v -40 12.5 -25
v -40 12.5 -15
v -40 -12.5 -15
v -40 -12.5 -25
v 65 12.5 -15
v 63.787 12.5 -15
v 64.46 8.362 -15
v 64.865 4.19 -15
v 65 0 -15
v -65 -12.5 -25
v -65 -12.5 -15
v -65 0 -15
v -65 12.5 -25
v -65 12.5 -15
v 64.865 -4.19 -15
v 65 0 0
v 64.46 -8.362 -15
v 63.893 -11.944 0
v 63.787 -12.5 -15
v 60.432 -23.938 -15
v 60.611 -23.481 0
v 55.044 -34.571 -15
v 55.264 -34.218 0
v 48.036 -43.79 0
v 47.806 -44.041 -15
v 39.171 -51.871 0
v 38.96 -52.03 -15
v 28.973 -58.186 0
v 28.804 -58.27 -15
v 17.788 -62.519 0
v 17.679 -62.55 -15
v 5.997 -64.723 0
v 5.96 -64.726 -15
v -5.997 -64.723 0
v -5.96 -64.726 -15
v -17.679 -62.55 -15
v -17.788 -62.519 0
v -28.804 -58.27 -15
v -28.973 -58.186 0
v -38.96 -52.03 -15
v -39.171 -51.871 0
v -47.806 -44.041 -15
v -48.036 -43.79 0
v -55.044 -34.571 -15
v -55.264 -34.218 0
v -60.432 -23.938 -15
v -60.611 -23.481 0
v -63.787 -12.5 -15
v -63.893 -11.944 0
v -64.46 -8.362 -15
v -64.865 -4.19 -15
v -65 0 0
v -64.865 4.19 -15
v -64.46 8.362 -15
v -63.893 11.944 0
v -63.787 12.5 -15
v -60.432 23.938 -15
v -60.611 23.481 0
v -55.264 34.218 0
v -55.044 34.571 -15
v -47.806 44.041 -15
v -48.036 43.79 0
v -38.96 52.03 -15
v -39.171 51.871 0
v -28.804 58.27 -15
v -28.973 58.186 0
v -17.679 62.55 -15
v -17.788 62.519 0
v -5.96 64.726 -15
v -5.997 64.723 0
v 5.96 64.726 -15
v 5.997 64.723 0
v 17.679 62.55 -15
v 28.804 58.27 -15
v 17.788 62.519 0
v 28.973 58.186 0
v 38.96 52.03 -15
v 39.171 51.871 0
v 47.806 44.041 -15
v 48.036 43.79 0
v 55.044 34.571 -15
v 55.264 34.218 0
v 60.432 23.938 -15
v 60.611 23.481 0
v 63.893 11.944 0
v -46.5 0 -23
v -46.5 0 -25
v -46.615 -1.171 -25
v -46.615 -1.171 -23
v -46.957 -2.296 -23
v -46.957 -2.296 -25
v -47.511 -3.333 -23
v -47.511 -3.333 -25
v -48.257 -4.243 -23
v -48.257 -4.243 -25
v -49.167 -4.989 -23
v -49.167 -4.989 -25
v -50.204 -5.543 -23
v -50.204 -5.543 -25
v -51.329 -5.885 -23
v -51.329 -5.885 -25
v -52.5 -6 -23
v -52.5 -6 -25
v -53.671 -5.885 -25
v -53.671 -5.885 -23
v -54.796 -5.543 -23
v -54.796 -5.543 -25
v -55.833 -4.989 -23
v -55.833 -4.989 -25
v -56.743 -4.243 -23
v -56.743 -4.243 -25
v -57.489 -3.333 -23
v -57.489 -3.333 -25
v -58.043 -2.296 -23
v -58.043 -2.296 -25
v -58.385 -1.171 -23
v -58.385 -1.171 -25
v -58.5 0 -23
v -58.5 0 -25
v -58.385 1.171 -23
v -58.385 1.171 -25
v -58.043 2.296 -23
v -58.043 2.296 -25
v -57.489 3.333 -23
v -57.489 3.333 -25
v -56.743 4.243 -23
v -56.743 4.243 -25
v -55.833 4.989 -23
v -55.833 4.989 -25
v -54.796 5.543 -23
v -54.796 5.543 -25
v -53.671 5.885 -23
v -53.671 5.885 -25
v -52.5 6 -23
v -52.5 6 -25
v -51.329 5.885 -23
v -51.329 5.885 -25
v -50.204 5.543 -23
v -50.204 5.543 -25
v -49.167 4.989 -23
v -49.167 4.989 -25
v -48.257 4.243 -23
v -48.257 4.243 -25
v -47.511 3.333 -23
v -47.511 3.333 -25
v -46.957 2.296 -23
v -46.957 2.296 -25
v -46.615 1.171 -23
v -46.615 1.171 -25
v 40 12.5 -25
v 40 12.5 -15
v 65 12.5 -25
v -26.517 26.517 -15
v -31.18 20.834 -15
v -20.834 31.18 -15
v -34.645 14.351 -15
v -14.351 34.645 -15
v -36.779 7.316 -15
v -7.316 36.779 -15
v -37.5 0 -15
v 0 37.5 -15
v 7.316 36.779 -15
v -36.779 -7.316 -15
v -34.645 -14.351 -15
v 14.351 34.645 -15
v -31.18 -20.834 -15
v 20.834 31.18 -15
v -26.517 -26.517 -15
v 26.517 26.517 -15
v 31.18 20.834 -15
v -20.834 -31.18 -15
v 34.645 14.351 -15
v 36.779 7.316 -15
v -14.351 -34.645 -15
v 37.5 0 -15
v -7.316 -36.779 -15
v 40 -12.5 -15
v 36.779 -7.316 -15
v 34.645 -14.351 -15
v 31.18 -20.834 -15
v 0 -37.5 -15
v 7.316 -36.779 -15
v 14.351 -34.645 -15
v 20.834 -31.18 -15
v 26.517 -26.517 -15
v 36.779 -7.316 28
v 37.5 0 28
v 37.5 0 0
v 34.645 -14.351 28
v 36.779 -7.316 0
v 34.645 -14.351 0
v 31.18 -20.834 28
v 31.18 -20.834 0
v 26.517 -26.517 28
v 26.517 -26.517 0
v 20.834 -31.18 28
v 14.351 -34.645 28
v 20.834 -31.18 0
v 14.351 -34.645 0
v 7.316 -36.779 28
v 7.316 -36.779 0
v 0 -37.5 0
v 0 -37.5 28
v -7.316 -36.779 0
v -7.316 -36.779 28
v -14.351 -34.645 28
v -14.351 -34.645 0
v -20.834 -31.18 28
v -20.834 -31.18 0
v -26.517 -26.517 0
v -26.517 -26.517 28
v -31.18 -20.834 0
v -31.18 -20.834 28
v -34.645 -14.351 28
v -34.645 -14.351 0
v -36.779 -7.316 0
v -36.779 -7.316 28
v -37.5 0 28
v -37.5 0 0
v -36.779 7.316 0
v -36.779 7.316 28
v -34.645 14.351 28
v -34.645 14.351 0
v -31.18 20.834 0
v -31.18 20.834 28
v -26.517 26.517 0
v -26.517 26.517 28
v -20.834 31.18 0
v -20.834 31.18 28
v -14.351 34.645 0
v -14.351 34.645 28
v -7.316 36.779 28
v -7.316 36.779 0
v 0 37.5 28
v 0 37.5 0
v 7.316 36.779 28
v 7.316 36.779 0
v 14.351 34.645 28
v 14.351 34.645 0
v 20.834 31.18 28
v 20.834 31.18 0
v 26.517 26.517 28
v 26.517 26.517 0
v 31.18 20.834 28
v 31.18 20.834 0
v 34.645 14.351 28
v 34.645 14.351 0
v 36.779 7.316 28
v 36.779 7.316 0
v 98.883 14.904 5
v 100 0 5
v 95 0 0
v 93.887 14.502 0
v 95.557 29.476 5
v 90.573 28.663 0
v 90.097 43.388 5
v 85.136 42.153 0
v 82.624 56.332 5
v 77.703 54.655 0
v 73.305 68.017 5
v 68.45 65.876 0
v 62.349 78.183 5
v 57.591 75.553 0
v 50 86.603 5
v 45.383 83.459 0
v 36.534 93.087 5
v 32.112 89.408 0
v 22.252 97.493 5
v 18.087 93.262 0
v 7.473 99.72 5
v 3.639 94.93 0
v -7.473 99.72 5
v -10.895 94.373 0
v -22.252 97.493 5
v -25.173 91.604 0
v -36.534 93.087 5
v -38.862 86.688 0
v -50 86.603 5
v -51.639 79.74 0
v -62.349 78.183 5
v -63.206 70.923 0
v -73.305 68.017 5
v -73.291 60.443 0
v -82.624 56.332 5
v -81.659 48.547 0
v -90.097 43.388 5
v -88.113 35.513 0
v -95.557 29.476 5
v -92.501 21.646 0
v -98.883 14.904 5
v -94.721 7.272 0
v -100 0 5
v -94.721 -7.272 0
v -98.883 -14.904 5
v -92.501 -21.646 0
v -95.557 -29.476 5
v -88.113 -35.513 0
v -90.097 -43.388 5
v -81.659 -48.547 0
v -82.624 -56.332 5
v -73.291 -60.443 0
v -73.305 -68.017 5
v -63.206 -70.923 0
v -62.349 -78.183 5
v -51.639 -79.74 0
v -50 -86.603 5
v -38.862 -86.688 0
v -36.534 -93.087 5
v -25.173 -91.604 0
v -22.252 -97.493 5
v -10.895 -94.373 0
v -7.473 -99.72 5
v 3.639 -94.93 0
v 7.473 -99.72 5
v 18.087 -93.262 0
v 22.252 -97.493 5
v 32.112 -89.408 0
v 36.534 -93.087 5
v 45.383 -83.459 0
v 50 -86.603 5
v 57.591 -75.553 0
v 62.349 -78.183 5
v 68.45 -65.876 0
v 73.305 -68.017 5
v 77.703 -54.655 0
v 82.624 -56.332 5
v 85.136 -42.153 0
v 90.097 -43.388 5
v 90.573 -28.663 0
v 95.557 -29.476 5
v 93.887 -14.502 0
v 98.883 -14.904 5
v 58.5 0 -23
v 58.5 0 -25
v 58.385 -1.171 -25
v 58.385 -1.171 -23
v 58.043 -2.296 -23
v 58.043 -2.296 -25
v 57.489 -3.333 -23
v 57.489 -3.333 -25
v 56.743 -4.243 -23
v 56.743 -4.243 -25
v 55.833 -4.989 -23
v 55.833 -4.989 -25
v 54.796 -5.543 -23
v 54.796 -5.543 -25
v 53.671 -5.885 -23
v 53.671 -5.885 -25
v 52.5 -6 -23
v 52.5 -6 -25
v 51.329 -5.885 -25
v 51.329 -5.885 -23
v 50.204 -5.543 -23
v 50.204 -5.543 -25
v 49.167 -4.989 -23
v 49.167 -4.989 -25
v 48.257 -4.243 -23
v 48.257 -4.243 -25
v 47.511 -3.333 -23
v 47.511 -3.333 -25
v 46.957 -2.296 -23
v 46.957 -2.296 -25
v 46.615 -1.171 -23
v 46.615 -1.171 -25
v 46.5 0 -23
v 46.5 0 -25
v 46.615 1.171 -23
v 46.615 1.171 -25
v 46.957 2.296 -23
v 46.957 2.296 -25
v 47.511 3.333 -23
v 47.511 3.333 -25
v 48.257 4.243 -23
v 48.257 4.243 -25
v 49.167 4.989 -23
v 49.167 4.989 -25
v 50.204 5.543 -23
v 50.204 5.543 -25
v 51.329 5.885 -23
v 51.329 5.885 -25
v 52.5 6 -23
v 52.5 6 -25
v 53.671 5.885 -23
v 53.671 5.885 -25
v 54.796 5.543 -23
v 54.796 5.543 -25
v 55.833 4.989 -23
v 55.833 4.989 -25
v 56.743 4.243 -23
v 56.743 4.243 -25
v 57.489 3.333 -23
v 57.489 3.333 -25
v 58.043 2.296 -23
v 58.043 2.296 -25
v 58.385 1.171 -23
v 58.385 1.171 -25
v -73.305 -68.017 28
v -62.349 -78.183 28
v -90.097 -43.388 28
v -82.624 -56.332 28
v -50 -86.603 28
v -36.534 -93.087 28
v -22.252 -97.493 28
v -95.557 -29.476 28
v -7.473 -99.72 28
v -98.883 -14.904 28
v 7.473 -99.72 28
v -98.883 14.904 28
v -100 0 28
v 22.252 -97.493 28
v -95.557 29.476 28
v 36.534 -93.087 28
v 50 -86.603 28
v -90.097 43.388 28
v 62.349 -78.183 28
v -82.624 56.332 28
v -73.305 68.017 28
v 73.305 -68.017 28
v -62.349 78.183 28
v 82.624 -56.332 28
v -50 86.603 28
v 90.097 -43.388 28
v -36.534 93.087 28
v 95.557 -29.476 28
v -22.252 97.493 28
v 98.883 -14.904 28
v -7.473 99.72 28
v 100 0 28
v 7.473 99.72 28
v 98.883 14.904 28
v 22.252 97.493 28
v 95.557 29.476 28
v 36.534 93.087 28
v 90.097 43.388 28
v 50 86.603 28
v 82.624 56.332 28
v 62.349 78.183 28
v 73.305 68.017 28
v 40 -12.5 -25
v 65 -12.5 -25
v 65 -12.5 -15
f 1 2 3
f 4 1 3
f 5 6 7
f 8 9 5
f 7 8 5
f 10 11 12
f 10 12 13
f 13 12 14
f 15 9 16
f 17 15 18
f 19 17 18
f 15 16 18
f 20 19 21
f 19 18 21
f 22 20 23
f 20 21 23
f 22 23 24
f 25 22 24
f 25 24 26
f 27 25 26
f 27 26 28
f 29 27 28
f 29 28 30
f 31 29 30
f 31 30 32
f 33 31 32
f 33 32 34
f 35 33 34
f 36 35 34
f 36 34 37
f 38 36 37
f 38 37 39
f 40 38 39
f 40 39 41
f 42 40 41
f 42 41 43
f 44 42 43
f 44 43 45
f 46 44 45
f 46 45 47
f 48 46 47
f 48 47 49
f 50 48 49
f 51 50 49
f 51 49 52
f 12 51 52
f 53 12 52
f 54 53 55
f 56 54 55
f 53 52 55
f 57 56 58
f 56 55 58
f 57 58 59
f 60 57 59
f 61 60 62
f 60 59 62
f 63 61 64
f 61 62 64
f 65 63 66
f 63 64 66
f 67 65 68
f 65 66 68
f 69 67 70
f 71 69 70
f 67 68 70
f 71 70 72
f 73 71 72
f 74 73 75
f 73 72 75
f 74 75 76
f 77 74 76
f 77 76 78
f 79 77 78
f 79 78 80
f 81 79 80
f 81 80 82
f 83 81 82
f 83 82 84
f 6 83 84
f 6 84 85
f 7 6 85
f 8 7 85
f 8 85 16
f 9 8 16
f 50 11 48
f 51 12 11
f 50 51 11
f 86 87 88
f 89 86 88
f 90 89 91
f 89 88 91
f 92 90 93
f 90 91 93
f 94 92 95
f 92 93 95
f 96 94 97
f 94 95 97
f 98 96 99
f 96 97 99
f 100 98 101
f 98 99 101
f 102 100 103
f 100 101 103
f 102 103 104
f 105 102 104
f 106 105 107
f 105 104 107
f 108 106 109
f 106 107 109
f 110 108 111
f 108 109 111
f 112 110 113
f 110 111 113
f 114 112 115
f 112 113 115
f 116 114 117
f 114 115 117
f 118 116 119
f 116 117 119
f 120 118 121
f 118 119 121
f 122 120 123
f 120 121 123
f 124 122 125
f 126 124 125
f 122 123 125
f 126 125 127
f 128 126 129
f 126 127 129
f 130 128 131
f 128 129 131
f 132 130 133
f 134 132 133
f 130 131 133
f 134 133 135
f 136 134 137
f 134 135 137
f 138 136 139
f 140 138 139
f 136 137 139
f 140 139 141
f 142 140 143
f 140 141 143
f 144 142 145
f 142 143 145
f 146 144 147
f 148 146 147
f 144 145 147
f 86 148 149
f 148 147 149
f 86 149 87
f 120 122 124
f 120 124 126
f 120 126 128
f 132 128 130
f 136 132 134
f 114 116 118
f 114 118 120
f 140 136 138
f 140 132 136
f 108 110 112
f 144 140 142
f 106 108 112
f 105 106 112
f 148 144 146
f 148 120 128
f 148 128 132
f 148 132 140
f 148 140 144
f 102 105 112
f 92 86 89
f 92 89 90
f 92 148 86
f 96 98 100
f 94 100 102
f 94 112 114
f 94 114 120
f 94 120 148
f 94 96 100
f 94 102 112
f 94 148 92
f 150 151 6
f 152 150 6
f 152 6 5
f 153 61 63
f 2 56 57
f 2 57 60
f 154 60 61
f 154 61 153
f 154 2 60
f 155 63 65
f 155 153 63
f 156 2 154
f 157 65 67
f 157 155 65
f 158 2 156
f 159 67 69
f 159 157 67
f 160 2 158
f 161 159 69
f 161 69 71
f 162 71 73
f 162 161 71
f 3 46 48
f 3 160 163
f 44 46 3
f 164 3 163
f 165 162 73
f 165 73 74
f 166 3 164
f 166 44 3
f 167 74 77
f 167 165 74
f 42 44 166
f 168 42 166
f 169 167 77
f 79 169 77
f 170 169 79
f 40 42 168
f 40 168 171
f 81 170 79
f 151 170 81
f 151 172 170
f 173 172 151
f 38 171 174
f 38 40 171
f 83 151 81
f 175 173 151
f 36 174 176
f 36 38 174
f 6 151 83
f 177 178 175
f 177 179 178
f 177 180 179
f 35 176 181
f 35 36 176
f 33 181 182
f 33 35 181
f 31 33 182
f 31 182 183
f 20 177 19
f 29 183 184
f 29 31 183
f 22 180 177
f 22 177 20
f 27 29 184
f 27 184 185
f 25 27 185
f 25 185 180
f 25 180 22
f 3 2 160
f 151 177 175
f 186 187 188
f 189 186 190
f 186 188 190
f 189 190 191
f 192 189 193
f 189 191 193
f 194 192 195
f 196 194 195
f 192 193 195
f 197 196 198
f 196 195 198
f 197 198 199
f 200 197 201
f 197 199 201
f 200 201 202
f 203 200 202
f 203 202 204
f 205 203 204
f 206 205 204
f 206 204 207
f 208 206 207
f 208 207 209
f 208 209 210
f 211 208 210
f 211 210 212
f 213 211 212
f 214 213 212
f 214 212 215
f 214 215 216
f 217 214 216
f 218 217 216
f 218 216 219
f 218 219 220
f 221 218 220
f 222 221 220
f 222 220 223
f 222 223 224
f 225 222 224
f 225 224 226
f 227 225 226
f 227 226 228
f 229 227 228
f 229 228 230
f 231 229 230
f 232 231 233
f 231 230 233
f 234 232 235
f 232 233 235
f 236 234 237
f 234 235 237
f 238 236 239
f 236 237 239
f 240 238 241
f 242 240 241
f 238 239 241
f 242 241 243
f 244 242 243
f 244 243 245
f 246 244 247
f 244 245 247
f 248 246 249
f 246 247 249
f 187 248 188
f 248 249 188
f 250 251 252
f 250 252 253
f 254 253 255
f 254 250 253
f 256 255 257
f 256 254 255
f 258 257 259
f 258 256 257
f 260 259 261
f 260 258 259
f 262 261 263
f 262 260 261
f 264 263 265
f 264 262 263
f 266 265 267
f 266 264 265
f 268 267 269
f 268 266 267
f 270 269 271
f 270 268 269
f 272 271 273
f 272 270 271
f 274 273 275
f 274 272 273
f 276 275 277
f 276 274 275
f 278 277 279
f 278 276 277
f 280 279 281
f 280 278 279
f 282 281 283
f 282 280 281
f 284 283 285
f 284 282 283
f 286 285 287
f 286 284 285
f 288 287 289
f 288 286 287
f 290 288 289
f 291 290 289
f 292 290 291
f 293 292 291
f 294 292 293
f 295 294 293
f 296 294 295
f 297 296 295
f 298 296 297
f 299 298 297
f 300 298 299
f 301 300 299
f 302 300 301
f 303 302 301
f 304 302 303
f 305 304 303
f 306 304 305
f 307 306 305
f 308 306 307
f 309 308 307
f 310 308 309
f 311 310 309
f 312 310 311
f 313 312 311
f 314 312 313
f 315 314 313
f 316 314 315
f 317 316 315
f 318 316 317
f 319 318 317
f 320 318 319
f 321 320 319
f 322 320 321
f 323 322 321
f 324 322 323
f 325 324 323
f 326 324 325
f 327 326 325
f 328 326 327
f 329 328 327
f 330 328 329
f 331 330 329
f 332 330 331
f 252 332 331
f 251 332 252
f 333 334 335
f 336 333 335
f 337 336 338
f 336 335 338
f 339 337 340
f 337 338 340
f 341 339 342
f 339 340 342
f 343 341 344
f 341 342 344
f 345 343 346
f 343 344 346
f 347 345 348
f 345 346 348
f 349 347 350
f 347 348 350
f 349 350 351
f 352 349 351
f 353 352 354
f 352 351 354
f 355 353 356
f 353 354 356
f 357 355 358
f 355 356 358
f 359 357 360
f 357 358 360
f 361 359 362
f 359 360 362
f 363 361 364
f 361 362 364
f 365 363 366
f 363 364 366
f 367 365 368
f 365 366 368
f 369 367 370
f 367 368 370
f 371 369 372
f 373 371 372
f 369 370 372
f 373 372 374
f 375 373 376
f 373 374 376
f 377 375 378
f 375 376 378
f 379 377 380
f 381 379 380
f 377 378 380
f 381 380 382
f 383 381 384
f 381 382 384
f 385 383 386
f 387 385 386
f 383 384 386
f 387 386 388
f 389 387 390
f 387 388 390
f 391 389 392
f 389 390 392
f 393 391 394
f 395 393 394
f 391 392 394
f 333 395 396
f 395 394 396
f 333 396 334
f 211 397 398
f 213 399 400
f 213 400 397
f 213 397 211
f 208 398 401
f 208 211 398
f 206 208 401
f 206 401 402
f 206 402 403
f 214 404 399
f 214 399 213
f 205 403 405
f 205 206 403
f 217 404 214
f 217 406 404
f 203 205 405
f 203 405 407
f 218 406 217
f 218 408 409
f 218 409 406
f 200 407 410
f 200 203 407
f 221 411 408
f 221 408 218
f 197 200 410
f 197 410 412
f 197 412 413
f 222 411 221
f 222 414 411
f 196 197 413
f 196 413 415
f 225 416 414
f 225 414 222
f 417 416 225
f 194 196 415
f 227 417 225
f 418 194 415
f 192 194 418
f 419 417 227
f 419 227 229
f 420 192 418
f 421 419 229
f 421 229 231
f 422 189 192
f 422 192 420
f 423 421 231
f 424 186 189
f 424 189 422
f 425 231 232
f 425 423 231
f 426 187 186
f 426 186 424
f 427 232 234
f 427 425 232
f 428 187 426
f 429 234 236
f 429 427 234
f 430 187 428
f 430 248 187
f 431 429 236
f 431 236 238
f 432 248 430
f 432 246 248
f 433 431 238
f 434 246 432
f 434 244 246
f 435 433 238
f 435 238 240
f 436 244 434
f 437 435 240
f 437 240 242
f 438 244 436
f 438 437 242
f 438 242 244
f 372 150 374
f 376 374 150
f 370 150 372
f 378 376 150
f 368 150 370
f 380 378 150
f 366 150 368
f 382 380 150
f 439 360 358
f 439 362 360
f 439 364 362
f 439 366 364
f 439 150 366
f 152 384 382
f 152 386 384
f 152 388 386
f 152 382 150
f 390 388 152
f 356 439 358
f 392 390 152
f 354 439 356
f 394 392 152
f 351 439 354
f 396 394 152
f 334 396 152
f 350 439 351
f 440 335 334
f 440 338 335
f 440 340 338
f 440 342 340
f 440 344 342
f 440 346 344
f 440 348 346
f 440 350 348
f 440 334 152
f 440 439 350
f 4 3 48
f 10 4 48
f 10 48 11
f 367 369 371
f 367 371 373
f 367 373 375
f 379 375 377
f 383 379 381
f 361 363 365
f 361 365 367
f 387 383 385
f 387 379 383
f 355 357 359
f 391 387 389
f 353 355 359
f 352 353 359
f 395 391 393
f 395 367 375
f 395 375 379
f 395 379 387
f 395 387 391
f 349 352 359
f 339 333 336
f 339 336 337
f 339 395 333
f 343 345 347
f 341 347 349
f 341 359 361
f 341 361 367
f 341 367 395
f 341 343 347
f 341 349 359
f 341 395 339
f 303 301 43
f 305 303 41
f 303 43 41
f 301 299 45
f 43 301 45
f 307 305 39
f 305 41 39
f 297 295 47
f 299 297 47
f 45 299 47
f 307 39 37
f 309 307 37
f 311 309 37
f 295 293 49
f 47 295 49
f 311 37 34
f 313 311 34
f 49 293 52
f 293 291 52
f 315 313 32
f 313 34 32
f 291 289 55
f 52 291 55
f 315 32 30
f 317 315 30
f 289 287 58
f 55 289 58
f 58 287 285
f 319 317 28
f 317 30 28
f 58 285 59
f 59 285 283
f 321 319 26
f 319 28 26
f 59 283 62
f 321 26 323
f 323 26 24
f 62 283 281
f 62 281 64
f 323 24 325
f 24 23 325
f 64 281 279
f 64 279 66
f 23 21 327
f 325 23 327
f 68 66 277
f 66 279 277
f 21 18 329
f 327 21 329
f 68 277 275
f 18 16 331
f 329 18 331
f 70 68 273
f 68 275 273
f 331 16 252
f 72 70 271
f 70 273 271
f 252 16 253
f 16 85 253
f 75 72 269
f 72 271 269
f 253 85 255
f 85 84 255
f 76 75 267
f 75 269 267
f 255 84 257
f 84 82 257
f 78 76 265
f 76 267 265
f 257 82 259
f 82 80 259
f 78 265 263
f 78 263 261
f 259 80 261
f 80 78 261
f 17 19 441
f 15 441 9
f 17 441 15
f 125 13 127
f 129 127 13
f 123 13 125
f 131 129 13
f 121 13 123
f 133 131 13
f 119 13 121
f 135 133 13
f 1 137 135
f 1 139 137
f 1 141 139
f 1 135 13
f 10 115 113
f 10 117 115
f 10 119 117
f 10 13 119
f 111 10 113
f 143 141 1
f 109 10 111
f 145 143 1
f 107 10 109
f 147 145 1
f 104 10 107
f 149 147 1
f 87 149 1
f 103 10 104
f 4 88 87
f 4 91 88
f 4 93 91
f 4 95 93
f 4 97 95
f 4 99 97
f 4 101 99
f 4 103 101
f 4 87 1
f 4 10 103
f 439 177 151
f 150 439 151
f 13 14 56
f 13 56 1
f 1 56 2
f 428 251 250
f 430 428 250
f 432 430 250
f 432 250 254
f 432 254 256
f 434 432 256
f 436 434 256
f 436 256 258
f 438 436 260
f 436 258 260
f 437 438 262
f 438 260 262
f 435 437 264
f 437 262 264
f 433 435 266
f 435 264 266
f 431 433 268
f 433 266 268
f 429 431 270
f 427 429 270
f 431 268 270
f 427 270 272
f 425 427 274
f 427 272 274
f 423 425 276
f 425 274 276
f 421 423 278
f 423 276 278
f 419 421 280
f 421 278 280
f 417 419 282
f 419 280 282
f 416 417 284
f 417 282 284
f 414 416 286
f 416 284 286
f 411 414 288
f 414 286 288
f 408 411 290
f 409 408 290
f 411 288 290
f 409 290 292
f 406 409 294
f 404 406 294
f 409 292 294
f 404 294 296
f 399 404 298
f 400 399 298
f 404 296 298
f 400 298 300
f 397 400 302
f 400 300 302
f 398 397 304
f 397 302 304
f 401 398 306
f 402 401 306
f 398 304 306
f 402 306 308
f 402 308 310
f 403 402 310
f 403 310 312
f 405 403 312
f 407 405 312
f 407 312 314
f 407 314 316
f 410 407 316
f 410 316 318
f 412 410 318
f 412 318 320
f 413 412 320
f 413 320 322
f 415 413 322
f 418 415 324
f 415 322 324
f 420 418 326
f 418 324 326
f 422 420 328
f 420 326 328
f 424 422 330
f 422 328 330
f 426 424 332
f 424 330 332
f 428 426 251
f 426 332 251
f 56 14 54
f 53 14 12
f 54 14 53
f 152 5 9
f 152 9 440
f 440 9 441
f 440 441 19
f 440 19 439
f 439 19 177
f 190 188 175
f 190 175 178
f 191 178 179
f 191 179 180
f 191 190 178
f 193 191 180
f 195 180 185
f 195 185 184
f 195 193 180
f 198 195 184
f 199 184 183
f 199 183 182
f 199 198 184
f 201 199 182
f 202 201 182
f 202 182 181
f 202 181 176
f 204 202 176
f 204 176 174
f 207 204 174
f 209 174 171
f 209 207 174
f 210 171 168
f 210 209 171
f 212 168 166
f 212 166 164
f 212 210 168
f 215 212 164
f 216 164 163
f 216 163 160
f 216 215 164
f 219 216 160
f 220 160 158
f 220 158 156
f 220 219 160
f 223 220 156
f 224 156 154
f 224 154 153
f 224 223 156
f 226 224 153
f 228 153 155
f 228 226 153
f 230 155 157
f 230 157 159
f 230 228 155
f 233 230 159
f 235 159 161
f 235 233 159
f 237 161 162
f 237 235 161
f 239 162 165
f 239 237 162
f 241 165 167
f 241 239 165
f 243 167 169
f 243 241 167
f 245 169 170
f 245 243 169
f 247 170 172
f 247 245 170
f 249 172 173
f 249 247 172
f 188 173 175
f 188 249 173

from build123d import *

# Parameters (mm, degrees)
F0_R      = 100
F1_DEPTH  = 28
F2_R      = 65
F2_R_2    = 37.5
F3_DEPTH  = 15
F5_DEPTH  = 10
F6_R      = 6
F7_DEPTH  = 2
F3_FACE_R = 37.5
F8_DEPTH  = 50
F9_SIZE   = 5


with BuildPart() as f1:
    # F0 (on Top) → F1 (new body)
    with BuildSketch(Plane.XY):
        Circle(F0_R)
    extrude(amount=F1_DEPTH)

    # F2 (on face) → F3 (join)
    with BuildSketch(Plane(origin=(0, 0, 0), x_dir=(1, 0, 0), z_dir=(0, 0, -1))):
        Circle(F2_R)
        Circle(F2_R_2, mode=Mode.SUBTRACT)
    extrude(amount=F3_DEPTH)

    # F4 (on face) → F5 (join)
    with BuildSketch(Plane(origin=(0, 0, -15), x_dir=(1, 0, 0), z_dir=(0, 0, -1))):
        with BuildLine():
            ThreePointArc((-65, 0), (-64.695978, -6.27937), (-63.786754, -12.5))
            Line((-63.786754, -12.5), (-40, -12.5))
            Line((-40, -12.5), (-40, 12.5))
            Line((-40, 12.5), (-63.786754, 12.5))
            ThreePointArc((-63.786754, 12.5), (-64.695978, 6.27937), (-65, 0))
        make_face()
        with BuildLine():
            Line((40, -12.5), (63.786754, -12.5))
            ThreePointArc((63.786754, -12.5), (64.695978, -6.27937), (65, 0))
            ThreePointArc((65, 0), (64.695978, 6.27937), (63.786754, 12.5))
            Line((63.786754, 12.5), (40, 12.5))
            Line((40, 12.5), (40, -12.5))
        make_face()
        with BuildLine():
            ThreePointArc((63.786754, 12.5), (64.695978, 6.27937), (65, 0))
            Line((65, 0), (65, 12.5))
            Line((65, 12.5), (63.786754, 12.5))
        make_face()
        with BuildLine():
            Line((63.786754, -12.5), (65, -12.5))
            Line((65, -12.5), (65, 0))
            ThreePointArc((65, 0), (64.695978, -6.27937), (63.786754, -12.5))
        make_face()
        with BuildLine():
            Line((-65, 12.5), (-65, 0))
            ThreePointArc((-65, 0), (-64.695978, 6.27937), (-63.786754, 12.5))
            Line((-63.786754, 12.5), (-65, 12.5))
        make_face()
        with BuildLine():
            Line((-65, -12.5), (-63.786754, -12.5))
            ThreePointArc((-63.786754, -12.5), (-64.695978, -6.27937), (-65, 0))
            Line((-65, 0), (-65, -12.5))
        make_face()
    extrude(amount=F5_DEPTH)

    # F6 (on face) → F7 (cut)
    with BuildSketch(Plane(origin=(0, 0, -25), x_dir=(1, 0, 0), z_dir=(0, 0, -1))):
        with Locations((52.5, 0)):
            Circle(F6_R)
        with Locations((-52.5, 0)):
            Circle(F6_R)
    extrude(amount=-F7_DEPTH, mode=Mode.SUBTRACT)

    # F3_face (on face) → F8 (cut)
    with BuildSketch(Plane(origin=(0, 0, -15), x_dir=(1, 0, 0), z_dir=(0, 0, -1))):
        Circle(F3_FACE_R)
    extrude(amount=-F8_DEPTH, mode=Mode.SUBTRACT)

    # F9
    f9_edges = [f1.edges().sort_by_distance(p)[0] for p in [
        (-100, 0, 0),
    ]]
    chamfer(f9_edges, length=F9_SIZE)


solid = f1.part
